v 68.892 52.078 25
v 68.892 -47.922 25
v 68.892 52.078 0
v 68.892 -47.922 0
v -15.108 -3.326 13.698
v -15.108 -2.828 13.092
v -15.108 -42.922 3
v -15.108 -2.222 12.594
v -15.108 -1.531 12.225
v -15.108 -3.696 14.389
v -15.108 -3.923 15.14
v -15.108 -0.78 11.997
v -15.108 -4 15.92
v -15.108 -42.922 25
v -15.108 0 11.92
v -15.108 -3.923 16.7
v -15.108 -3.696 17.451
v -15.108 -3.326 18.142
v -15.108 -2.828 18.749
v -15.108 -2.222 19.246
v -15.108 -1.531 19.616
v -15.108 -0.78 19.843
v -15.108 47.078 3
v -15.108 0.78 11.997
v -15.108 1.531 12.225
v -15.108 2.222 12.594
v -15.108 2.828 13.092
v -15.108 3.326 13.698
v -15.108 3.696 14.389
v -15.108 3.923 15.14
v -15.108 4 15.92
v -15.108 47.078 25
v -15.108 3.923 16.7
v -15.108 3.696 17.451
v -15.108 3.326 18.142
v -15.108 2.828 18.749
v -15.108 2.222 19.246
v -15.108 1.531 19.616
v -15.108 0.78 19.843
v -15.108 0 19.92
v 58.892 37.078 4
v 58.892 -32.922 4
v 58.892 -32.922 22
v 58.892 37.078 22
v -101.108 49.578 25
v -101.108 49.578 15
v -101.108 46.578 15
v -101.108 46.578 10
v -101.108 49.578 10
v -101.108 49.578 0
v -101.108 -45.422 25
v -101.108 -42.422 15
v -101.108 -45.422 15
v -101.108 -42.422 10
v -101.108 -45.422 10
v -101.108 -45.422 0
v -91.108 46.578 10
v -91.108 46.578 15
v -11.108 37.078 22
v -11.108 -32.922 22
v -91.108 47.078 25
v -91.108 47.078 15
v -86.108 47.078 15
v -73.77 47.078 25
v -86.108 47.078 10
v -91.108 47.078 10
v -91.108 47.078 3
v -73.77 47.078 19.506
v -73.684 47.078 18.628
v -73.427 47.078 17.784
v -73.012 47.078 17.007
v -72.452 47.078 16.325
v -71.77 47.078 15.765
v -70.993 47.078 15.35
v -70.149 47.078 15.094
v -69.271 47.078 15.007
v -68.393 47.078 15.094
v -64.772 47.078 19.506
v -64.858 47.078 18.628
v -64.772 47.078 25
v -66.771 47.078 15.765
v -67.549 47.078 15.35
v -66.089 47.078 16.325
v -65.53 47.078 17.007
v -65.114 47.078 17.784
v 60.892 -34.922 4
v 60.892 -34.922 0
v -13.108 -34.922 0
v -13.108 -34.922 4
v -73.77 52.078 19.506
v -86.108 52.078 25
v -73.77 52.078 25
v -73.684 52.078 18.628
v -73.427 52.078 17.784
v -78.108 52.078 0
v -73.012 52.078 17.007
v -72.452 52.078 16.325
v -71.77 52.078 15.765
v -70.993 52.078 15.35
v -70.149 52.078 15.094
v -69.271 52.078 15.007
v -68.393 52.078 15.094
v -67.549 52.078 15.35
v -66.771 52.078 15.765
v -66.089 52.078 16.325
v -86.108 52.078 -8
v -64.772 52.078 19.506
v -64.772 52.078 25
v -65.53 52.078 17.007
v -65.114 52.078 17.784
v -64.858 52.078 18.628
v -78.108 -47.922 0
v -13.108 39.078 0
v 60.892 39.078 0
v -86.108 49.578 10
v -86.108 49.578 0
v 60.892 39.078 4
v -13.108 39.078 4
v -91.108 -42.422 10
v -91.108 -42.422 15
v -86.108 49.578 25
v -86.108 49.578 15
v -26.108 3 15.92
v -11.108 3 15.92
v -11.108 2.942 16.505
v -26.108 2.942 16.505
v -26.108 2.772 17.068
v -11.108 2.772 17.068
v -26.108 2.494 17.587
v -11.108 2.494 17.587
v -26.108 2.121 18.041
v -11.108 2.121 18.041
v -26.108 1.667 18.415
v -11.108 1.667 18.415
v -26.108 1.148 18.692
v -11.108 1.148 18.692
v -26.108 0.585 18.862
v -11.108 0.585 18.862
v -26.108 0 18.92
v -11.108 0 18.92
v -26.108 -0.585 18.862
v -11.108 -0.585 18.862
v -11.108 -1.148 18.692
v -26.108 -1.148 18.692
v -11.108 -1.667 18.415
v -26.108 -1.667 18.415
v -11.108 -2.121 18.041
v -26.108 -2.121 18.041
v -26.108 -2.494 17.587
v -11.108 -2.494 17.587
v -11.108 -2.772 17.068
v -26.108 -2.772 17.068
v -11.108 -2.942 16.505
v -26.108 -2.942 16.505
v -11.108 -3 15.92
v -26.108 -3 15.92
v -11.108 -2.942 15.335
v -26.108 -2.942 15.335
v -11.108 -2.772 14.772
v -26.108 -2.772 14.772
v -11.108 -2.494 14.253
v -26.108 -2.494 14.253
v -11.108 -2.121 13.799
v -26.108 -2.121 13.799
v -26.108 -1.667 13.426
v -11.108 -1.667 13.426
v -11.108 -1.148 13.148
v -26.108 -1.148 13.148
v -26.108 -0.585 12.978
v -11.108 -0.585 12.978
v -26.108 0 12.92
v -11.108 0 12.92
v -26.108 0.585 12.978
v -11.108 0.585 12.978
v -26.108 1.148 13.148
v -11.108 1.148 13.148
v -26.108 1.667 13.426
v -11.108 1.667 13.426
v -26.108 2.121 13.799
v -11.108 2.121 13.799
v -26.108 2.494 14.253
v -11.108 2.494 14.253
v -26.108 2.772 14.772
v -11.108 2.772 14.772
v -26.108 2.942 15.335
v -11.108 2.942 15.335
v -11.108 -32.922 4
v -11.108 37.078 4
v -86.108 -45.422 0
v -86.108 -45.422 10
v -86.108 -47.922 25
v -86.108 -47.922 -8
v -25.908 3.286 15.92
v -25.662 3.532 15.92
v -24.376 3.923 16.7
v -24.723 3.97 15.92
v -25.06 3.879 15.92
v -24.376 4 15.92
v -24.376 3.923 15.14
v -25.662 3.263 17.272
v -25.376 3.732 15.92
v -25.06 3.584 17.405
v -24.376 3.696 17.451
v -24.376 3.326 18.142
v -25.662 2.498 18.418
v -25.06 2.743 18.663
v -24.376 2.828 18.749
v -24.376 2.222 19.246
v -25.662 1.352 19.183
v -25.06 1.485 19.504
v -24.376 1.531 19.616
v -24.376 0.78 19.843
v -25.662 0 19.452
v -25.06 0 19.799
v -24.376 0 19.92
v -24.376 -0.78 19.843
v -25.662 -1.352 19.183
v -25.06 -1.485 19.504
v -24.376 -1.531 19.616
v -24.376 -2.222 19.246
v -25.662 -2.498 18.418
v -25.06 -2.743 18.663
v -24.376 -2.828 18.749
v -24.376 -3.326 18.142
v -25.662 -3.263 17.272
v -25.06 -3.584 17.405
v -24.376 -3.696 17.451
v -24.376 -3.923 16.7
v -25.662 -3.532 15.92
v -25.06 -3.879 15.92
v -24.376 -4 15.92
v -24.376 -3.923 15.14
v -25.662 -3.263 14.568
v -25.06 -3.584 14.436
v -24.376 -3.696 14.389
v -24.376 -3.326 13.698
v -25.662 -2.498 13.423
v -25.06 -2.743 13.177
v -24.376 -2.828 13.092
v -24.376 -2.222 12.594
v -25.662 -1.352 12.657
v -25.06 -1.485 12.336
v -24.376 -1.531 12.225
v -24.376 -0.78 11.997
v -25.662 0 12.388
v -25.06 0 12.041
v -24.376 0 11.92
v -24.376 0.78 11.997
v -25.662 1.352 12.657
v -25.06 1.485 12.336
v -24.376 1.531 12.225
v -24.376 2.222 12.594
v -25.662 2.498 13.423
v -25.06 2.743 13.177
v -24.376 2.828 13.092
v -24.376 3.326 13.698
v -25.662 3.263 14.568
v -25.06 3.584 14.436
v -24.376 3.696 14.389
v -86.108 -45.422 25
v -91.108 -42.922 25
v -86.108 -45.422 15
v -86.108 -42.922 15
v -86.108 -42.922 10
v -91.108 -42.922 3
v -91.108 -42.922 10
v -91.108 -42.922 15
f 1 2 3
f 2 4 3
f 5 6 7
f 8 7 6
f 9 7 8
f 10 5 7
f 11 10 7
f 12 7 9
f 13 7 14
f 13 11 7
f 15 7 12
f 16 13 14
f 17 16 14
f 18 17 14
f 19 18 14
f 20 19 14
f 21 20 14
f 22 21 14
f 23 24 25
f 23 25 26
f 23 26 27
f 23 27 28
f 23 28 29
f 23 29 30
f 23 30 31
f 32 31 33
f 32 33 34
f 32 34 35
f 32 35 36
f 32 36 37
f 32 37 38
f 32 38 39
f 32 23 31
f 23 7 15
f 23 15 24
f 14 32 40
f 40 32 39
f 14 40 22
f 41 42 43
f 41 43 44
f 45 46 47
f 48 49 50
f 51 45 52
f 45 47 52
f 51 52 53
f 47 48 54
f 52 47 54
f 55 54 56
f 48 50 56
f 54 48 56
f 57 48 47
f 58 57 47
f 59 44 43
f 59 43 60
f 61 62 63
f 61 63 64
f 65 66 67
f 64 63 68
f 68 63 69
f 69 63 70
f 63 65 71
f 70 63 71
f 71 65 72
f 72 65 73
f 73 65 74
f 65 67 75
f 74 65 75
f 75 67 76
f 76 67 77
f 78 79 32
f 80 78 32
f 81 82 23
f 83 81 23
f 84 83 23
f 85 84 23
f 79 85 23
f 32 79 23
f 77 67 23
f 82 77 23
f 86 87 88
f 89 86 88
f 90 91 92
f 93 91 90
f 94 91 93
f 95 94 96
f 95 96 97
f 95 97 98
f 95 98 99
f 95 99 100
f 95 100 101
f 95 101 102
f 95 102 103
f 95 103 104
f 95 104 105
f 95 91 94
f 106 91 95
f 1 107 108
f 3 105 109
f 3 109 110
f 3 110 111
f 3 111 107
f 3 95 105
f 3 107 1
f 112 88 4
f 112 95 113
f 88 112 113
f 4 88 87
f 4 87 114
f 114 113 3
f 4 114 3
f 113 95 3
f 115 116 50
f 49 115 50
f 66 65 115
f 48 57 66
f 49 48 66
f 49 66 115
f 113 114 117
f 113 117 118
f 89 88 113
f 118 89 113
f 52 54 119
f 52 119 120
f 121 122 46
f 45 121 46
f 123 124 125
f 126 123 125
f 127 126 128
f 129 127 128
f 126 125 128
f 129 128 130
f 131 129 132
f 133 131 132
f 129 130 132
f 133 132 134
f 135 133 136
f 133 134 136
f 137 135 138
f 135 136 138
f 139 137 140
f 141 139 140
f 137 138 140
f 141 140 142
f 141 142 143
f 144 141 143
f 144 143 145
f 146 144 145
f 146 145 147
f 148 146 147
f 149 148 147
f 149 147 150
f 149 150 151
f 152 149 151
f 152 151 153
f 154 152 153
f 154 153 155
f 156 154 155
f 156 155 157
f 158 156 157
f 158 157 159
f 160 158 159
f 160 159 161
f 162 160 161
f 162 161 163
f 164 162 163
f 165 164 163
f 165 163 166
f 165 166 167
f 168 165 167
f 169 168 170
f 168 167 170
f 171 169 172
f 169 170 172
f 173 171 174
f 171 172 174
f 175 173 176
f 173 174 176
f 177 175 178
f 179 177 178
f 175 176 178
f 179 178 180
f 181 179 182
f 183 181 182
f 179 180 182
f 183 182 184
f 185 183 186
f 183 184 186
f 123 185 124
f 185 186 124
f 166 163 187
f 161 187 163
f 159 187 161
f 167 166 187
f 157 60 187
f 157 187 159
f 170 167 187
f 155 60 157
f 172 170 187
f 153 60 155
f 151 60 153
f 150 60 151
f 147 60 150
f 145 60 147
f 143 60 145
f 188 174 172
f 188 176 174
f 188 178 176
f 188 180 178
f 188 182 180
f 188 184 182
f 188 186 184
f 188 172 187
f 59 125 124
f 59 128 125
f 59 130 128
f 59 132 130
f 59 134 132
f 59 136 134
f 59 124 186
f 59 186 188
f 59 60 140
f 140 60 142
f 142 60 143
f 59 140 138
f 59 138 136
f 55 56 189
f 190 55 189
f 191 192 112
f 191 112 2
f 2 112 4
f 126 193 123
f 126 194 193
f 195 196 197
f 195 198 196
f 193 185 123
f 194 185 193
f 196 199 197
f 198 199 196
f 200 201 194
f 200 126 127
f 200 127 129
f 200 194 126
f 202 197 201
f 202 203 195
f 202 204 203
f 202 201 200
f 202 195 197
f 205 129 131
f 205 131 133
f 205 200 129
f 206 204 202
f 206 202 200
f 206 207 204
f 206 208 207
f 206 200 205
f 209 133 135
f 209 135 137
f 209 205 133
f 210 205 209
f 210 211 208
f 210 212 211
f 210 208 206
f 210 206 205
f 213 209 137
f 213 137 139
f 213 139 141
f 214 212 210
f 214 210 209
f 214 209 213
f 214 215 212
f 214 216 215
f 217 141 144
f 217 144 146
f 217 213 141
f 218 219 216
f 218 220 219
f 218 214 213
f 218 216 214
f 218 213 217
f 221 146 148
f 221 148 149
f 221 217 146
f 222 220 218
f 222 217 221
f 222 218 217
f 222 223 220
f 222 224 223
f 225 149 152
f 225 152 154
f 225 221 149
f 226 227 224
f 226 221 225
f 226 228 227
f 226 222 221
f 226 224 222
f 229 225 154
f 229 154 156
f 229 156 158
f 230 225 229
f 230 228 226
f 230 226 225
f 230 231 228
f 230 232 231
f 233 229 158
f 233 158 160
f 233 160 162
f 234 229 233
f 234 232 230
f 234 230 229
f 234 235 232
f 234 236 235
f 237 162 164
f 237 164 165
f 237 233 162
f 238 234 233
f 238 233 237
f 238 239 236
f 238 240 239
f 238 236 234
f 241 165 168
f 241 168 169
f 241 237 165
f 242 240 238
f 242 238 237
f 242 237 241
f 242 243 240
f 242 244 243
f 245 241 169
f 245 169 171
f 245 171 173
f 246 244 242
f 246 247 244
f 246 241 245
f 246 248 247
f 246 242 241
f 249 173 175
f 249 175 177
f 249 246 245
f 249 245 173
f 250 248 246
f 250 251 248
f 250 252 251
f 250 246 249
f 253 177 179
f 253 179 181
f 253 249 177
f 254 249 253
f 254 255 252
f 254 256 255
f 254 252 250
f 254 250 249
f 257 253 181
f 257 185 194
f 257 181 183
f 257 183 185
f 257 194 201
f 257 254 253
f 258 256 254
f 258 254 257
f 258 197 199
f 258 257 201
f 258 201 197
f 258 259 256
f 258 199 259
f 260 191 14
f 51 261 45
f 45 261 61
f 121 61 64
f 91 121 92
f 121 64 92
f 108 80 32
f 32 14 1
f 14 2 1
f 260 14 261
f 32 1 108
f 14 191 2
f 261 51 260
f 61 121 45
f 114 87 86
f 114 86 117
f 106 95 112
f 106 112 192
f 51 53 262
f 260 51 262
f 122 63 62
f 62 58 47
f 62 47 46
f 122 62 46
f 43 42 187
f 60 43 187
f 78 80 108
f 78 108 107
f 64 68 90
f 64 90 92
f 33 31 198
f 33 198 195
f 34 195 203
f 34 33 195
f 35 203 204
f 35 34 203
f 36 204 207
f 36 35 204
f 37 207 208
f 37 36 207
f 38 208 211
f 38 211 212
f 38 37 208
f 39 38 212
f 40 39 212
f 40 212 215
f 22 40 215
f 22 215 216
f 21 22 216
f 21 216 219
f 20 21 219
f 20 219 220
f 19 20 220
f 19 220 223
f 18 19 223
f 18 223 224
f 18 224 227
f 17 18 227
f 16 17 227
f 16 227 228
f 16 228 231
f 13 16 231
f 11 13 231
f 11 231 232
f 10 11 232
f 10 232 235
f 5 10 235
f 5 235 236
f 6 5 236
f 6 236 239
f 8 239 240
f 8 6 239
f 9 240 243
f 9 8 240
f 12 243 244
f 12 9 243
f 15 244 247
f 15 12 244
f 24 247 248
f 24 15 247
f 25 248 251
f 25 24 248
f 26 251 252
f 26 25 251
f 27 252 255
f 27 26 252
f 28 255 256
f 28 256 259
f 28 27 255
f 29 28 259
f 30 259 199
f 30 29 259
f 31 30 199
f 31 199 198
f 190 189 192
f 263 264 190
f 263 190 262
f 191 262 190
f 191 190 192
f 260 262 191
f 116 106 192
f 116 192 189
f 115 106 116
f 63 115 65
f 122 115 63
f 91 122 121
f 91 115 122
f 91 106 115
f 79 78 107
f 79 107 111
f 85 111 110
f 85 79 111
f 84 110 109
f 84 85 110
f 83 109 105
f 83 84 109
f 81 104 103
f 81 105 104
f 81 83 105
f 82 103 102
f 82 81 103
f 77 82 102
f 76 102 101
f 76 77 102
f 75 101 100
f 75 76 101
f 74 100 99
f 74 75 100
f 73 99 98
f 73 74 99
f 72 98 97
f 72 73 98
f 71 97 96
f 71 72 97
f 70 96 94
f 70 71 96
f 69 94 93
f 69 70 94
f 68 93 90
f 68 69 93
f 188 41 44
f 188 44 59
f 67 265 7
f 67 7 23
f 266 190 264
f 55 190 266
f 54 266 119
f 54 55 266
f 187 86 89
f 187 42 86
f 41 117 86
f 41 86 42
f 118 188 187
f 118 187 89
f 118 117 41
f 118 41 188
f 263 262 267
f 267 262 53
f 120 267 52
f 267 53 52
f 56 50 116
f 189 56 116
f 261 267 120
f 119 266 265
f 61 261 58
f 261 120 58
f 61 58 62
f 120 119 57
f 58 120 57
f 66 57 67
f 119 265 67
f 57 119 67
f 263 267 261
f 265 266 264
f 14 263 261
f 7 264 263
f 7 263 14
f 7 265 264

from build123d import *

# Parameters (mm, degrees)
SKETCH1_W                = 170
SKETCH1_H                = 100
BOSS_EXTRUDE1_DEPTH      = 15
SKETCH2_W                = 70
SKETCH2_H                = 70
CUT_EXTRUDE1_DEPTH       = 13
SKETCH3_W                = 70
SKETCH3_H                = 90
CUT_EXTRUDE2_DEPTH       = 12
SKETCH8_W                = 15
SKETCH8_H                = 15
CUT_EXTRUDE9_DEPTH       = 2.5
SKETCH9_W                = 15
SKETCH9_H                = 15
CUT_EXTRUDE10_DEPTH      = 2.5
SKETCH10_W               = 12
SKETCH10_H               = 90
CUT_EXTRUDE11_DEPTH      = 10
SKETCH11_W               = 80
SKETCH11_H               = 90
BOSS_EXTRUDE2_DEPTH      = 10
SKETCH12_W               = 22
SKETCH12_H               = 90
BOSS_EXTRUDE4_DEPTH      = 4
SKETCH2_2_W              = 70
SKETCH2_2_H              = 70
CUT_EXTRUDE12_DEPTH      = 22
SKETCH13_W               = 74
SKETCH13_H               = 74
SKETCH13_W_2             = 70
SKETCH13_H_2             = 70
CUT_EXTRUDE13_DEPTH      = 4
BOSS_EXTRUDE6_DEPTH      = 100
SKETCH15_W               = 5
SKETCH15_H               = 3
CUT_EXTRUDE14_DEPTH      = 15
SKETCH16_R               = 4
SKETCH16_R_2             = 3
BOSS_EXTRUDE7_DEPTH      = 15
SKETCH16_3_R             = 3
CUT_EXTRUDE15_DEPTH      = 15
FILLET1_R                = 2
CUT_EXTRUDE16_DEPTH      = 145.387791679
CUT_EXTRUDE16_DEPTH_BACK = 15


with BuildPart() as part:
    # Sketch1 → Boss-Extrude1 (new body)
    with BuildSketch(Plane.XY):
        with Locations((-16.108033241, 2.077562327)):
            Rectangle(SKETCH1_W, SKETCH1_H)
    extrude(amount=BOSS_EXTRUDE1_DEPTH)

    # Sketch2 → Cut-Extrude1 (cut)
    with BuildSketch(Plane(origin=(0, 0, 0), x_dir=(-1, 0, 0), z_dir=(0, 0, -1))):
        with Locations((-23.891966759, 2.077562327)):
            Rectangle(SKETCH2_W, SKETCH2_H)
    extrude(amount=-CUT_EXTRUDE1_DEPTH, mode=Mode.SUBTRACT)

    # Sketch3 → Cut-Extrude2 (cut)
    with BuildSketch(Plane.XY.offset(15)):
        with Locations((-56.108033241, 2.077562327)):
            Rectangle(SKETCH3_W, SKETCH3_H)
    extrude(amount=-CUT_EXTRUDE2_DEPTH, mode=Mode.SUBTRACT)

    # Sketch8 → Cut-Extrude9 (cut)
    with BuildSketch(Plane(origin=(0, 52.077562327, 0), x_dir=(1, 0, 0), z_dir=(0, 1, 0))):
        with Locations((-93.608033241, -7.5)):
            Rectangle(SKETCH8_W, SKETCH8_H)
    extrude(amount=-CUT_EXTRUDE9_DEPTH, mode=Mode.SUBTRACT)

    # Sketch9 → Cut-Extrude10 (cut)
    with BuildSketch(Plane.XZ.offset(47.922437673)):
        with Locations((-93.608033241, 7.5)):
            Rectangle(SKETCH9_W, SKETCH9_H)
    extrude(amount=-CUT_EXTRUDE10_DEPTH, mode=Mode.SUBTRACT)

    # Sketch10 → Cut-Extrude11 (cut)
    with BuildSketch(Plane.ZY.offset(21.108033241)):
        with Locations((9, 2.077562327)):
            Rectangle(SKETCH10_W, SKETCH10_H)
    extrude(amount=-CUT_EXTRUDE11_DEPTH, mode=Mode.SUBTRACT)

    # Sketch11 → Boss-Extrude2 (add)
    with BuildSketch(Plane.XY.offset(15)):
        Polygon((-86.108033241, -45.422437673), (-86.108033241, -47.922437673), (68.891966759, -47.922437673), (68.891966759, 52.077562327), (-86.108033241, 52.077562327), (-86.108033241, 49.577562327), (-101.108033241, 49.577562327), (-101.108033241, -45.422437673), align=None)
        with Locations((-51.108033241, 2.077562327)):
            Rectangle(SKETCH11_W, SKETCH11_H, mode=Mode.SUBTRACT)
    extrude(amount=BOSS_EXTRUDE2_DEPTH)

    # Sketch12 → Boss-Extrude4 (add)
    with BuildSketch(Plane.ZY.offset(11.108033241)):
        with Locations((14, 2.077562327)):
            Rectangle(SKETCH12_W, SKETCH12_H)
    extrude(amount=BOSS_EXTRUDE4_DEPTH)

    # Sketch2<2> → Cut-Extrude12 (cut)
    with BuildSketch(Plane(origin=(0, 0, 0), x_dir=(-1, 0, 0), z_dir=(0, 0, -1))):
        with Locations((-23.891966759, 2.077562327)):
            Rectangle(SKETCH2_2_W, SKETCH2_2_H)
    extrude(amount=-CUT_EXTRUDE12_DEPTH, mode=Mode.SUBTRACT)

    # Sketch13 → Cut-Extrude13 (cut)
    with BuildSketch(Plane(origin=(0, 0, 0), x_dir=(-1, 0, 0), z_dir=(0, 0, -1))):
        with Locations((-23.891966759, 2.077562327)):
            Rectangle(SKETCH13_W, SKETCH13_H)
        with Locations((-23.891966759, 2.077562327)):
            Rectangle(SKETCH13_W_2, SKETCH13_H_2, mode=Mode.SUBTRACT)
    extrude(amount=-CUT_EXTRUDE13_DEPTH, mode=Mode.SUBTRACT)

    # Sketch14 → Boss-Extrude6 (add)
    with BuildSketch(Plane(origin=(0, 52.077562327, 0), x_dir=(1, 0, 0), z_dir=(0, 1, 0))):
        Polygon((-86.108033241, 0), (-78.108033241, 0), (-86.108033241, 8), align=None)
    extrude(amount=-BOSS_EXTRUDE6_DEPTH)

    # Sketch15 → Cut-Extrude14 (cut)
    with BuildSketch(Plane.ZY.offset(101.108033241)):
        with Locations((12.5, 48.077562327)):
            Rectangle(SKETCH15_W, SKETCH15_H)
        with Locations((12.5, -43.922437673)):
            Rectangle(SKETCH15_W, SKETCH15_H)
    extrude(amount=-CUT_EXTRUDE14_DEPTH, mode=Mode.SUBTRACT)

    # Sketch16 → Boss-Extrude7 (add)
    with BuildSketch(Plane(origin=(-11.108033241, 0, 0), x_dir=(0, 0, -1), z_dir=(1, 0, 0))):
        with Locations(Location((-15.920102605, 0, 0), (0, 0, 90))):
            Circle(SKETCH16_R)
        with Locations(Location((-15.920102605, 0, 0), (0, 0, 90))):
            Circle(SKETCH16_R_2, mode=Mode.SUBTRACT)
    extrude(amount=-BOSS_EXTRUDE7_DEPTH)

    # Sketch16<3> → Cut-Extrude15 (cut)
    with BuildSketch(Plane(origin=(-11.108033241, 0, 0), x_dir=(0, 0, -1), z_dir=(1, 0, 0))):
        with Locations(Location((-15.920102605, 0, 0), (0, 0, 90))):
            Circle(SKETCH16_3_R)
    extrude(amount=-CUT_EXTRUDE15_DEPTH, mode=Mode.SUBTRACT)

    # Fillet1
    # the kernel refuses this fillet: 2 mm, written as the material it takes off along each edge
    with BuildSketch(Plane(origin=(-26.108033241, 0, 15.920102605), x_dir=(0, 1, 0), z_dir=(0, 0, -1))) as fillet1_piece_1:
        with BuildLine():
            CenterArc((2, 1.732050808), FILLET1_R, 300, 60)
            Line((3, 0), (3.02, -0.034641016))
            ThreePointArc((3.02, -0.034641016), (3.5, -0.04), (4, -0.04))
            Line((4, -0.04), (4.04, 0))
            Line((4.04, 0), (4.04, 1.732050808))
            Line((4.04, 1.732050808), (4, 1.732050808))
        make_face()
    revolve(axis=Axis((-26.108033241, 0, 15.920102605), (1, 0, 0)), mode=Mode.SUBTRACT)

    # Sketch17 → Cut-Extrude16 (cut, two sides: drawn at the far end of the back side and taken through both)
    with BuildSketch(Plane(origin=(0, 52.077562327, 0), x_dir=(1, 0, 0), z_dir=(0, 1, 0)).offset(-CUT_EXTRUDE16_DEPTH_BACK)):
        with BuildLine():
            Line((-64.771644572, -25), (-64.771644572, -19.506214928))
            ThreePointArc((-64.771644572, -19.506214928), (-69.270802051, -15.007057449), (-73.76995953, -19.506214928))
            Line((-73.76995953, -19.506214928), (-73.76995953, -25))
            Line((-73.76995953, -25), (-64.771644572, -25))
        make_face()
    extrude(amount=CUT_EXTRUDE16_DEPTH + CUT_EXTRUDE16_DEPTH_BACK, mode=Mode.SUBTRACT)


solid = part.part
